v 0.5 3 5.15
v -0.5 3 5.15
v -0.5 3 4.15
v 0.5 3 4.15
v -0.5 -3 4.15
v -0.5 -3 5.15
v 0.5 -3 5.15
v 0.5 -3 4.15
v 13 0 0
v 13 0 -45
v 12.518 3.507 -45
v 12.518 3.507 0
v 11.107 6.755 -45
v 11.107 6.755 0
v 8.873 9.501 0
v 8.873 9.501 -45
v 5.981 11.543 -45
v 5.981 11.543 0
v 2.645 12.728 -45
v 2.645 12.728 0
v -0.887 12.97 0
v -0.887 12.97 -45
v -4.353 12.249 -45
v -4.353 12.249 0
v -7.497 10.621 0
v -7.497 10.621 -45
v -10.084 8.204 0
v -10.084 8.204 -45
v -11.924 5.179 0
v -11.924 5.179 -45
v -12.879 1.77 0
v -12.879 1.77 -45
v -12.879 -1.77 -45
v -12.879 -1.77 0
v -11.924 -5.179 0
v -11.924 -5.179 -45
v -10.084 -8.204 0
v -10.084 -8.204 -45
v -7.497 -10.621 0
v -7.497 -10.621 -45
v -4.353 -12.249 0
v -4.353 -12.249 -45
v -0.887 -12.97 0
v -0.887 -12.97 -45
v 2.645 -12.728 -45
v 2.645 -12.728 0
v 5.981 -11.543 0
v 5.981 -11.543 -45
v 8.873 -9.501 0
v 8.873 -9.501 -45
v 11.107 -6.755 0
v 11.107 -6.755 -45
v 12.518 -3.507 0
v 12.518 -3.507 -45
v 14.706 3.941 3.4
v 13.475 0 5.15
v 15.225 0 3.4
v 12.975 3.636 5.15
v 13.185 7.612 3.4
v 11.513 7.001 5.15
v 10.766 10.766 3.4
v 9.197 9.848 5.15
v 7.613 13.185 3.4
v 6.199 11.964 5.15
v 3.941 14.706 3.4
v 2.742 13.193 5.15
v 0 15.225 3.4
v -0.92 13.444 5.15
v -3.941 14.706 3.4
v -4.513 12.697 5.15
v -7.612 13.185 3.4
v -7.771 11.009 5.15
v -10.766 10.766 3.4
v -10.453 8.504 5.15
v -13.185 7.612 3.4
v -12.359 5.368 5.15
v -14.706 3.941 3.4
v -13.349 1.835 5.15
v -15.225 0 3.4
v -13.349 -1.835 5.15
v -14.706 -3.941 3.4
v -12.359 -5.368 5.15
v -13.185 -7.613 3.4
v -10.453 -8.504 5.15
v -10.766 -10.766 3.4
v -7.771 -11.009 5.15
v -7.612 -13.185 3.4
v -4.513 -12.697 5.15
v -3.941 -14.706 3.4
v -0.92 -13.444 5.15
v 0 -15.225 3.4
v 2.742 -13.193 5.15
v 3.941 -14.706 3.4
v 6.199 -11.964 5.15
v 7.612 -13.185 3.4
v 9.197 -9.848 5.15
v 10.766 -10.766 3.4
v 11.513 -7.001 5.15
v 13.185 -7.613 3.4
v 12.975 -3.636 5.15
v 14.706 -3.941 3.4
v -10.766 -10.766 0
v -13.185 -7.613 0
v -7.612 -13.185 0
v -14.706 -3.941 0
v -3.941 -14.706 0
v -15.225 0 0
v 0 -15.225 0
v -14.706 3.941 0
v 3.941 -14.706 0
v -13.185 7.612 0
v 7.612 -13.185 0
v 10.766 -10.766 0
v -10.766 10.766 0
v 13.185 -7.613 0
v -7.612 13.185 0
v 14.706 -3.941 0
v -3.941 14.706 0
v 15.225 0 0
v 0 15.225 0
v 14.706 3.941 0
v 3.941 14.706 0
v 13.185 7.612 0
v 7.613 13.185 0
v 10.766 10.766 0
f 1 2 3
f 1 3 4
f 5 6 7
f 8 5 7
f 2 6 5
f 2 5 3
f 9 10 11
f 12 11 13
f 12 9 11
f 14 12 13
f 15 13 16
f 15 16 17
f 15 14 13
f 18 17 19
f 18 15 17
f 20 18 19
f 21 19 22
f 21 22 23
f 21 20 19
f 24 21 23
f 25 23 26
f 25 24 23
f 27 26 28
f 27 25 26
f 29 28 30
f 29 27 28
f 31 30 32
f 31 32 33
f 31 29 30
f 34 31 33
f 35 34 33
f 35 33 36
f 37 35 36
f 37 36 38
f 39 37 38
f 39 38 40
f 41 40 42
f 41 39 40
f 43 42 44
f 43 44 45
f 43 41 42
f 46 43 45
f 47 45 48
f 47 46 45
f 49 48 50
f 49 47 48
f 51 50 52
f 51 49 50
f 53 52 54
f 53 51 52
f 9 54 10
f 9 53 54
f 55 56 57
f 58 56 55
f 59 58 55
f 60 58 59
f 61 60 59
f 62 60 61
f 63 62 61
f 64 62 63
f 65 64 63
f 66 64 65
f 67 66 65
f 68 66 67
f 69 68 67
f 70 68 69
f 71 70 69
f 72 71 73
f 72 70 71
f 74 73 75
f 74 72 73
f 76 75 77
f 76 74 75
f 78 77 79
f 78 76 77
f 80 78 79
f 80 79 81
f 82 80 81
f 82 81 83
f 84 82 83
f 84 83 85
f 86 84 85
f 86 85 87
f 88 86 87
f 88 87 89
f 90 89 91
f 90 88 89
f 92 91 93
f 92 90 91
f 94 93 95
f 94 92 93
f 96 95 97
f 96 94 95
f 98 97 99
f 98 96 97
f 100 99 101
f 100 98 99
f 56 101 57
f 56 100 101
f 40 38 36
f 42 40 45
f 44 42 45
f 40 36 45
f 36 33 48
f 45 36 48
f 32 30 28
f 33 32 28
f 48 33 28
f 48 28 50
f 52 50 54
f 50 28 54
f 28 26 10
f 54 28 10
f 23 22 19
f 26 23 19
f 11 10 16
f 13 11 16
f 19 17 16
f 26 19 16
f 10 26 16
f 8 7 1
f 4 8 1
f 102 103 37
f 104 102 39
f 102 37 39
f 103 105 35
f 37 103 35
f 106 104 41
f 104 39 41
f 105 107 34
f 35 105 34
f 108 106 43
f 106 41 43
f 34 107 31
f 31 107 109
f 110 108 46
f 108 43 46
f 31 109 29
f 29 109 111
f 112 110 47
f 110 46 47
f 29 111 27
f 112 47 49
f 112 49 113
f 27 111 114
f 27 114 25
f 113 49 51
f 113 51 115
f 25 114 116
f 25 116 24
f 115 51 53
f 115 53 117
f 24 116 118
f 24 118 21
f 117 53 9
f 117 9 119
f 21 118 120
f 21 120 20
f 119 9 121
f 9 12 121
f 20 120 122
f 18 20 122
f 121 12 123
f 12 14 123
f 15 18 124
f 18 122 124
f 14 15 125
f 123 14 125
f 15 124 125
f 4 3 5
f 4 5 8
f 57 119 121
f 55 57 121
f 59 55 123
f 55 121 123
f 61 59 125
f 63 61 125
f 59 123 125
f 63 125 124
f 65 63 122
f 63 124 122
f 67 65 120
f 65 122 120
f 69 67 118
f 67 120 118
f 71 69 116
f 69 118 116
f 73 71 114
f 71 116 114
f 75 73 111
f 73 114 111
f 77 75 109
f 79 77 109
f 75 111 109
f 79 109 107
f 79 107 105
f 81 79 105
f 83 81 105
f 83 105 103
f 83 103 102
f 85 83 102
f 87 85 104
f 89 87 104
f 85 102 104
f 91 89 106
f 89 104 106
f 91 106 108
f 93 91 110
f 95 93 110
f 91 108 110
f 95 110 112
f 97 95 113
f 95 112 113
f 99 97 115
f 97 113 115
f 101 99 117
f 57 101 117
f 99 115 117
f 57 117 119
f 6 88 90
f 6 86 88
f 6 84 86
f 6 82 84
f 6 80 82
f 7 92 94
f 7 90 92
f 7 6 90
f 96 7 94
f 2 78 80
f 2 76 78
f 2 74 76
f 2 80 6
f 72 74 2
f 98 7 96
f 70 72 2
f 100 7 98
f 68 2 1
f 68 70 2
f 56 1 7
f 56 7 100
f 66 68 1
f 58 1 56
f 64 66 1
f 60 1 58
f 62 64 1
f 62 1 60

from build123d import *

# Parameters (mm, degrees)
SKETCH1_R           = 13
BOSS_EXTRUDE1_DEPTH = 45
SKETCH2_R           = 15.225
BOSS_EXTRUDE2_DEPTH = 3.4
SKETCH3_R           = 15.225
BOSS_EXTRUDE3_DEPTH = 1.75
BOSS_EXTRUDE3_TAPER = 45
SKETCH4_W           = 1
SKETCH4_H           = 6
CUT_EXTRUDE1_DEPTH  = 1


with BuildPart() as part:
    # Sketch1 → Boss-Extrude1 (new body)
    with BuildSketch(Plane.XY):
        Circle(SKETCH1_R)
    extrude(amount=-BOSS_EXTRUDE1_DEPTH)

    # Sketch2 → Boss-Extrude2 (add)
    with BuildSketch(Plane.XY):
        Circle(SKETCH2_R)
    extrude(amount=BOSS_EXTRUDE2_DEPTH)

    # Sketch3 → Boss-Extrude3 (add)
    with BuildSketch(Plane.XY.offset(3.4)):
        Circle(SKETCH3_R)
    extrude(amount=BOSS_EXTRUDE3_DEPTH, taper=BOSS_EXTRUDE3_TAPER)

    # Sketch4 → Cut-Extrude1 (cut)
    with BuildSketch(Plane.XY.offset(5.15)):
        Rectangle(SKETCH4_W, SKETCH4_H)
    extrude(amount=-CUT_EXTRUDE1_DEPTH, mode=Mode.SUBTRACT)


solid = part.part
